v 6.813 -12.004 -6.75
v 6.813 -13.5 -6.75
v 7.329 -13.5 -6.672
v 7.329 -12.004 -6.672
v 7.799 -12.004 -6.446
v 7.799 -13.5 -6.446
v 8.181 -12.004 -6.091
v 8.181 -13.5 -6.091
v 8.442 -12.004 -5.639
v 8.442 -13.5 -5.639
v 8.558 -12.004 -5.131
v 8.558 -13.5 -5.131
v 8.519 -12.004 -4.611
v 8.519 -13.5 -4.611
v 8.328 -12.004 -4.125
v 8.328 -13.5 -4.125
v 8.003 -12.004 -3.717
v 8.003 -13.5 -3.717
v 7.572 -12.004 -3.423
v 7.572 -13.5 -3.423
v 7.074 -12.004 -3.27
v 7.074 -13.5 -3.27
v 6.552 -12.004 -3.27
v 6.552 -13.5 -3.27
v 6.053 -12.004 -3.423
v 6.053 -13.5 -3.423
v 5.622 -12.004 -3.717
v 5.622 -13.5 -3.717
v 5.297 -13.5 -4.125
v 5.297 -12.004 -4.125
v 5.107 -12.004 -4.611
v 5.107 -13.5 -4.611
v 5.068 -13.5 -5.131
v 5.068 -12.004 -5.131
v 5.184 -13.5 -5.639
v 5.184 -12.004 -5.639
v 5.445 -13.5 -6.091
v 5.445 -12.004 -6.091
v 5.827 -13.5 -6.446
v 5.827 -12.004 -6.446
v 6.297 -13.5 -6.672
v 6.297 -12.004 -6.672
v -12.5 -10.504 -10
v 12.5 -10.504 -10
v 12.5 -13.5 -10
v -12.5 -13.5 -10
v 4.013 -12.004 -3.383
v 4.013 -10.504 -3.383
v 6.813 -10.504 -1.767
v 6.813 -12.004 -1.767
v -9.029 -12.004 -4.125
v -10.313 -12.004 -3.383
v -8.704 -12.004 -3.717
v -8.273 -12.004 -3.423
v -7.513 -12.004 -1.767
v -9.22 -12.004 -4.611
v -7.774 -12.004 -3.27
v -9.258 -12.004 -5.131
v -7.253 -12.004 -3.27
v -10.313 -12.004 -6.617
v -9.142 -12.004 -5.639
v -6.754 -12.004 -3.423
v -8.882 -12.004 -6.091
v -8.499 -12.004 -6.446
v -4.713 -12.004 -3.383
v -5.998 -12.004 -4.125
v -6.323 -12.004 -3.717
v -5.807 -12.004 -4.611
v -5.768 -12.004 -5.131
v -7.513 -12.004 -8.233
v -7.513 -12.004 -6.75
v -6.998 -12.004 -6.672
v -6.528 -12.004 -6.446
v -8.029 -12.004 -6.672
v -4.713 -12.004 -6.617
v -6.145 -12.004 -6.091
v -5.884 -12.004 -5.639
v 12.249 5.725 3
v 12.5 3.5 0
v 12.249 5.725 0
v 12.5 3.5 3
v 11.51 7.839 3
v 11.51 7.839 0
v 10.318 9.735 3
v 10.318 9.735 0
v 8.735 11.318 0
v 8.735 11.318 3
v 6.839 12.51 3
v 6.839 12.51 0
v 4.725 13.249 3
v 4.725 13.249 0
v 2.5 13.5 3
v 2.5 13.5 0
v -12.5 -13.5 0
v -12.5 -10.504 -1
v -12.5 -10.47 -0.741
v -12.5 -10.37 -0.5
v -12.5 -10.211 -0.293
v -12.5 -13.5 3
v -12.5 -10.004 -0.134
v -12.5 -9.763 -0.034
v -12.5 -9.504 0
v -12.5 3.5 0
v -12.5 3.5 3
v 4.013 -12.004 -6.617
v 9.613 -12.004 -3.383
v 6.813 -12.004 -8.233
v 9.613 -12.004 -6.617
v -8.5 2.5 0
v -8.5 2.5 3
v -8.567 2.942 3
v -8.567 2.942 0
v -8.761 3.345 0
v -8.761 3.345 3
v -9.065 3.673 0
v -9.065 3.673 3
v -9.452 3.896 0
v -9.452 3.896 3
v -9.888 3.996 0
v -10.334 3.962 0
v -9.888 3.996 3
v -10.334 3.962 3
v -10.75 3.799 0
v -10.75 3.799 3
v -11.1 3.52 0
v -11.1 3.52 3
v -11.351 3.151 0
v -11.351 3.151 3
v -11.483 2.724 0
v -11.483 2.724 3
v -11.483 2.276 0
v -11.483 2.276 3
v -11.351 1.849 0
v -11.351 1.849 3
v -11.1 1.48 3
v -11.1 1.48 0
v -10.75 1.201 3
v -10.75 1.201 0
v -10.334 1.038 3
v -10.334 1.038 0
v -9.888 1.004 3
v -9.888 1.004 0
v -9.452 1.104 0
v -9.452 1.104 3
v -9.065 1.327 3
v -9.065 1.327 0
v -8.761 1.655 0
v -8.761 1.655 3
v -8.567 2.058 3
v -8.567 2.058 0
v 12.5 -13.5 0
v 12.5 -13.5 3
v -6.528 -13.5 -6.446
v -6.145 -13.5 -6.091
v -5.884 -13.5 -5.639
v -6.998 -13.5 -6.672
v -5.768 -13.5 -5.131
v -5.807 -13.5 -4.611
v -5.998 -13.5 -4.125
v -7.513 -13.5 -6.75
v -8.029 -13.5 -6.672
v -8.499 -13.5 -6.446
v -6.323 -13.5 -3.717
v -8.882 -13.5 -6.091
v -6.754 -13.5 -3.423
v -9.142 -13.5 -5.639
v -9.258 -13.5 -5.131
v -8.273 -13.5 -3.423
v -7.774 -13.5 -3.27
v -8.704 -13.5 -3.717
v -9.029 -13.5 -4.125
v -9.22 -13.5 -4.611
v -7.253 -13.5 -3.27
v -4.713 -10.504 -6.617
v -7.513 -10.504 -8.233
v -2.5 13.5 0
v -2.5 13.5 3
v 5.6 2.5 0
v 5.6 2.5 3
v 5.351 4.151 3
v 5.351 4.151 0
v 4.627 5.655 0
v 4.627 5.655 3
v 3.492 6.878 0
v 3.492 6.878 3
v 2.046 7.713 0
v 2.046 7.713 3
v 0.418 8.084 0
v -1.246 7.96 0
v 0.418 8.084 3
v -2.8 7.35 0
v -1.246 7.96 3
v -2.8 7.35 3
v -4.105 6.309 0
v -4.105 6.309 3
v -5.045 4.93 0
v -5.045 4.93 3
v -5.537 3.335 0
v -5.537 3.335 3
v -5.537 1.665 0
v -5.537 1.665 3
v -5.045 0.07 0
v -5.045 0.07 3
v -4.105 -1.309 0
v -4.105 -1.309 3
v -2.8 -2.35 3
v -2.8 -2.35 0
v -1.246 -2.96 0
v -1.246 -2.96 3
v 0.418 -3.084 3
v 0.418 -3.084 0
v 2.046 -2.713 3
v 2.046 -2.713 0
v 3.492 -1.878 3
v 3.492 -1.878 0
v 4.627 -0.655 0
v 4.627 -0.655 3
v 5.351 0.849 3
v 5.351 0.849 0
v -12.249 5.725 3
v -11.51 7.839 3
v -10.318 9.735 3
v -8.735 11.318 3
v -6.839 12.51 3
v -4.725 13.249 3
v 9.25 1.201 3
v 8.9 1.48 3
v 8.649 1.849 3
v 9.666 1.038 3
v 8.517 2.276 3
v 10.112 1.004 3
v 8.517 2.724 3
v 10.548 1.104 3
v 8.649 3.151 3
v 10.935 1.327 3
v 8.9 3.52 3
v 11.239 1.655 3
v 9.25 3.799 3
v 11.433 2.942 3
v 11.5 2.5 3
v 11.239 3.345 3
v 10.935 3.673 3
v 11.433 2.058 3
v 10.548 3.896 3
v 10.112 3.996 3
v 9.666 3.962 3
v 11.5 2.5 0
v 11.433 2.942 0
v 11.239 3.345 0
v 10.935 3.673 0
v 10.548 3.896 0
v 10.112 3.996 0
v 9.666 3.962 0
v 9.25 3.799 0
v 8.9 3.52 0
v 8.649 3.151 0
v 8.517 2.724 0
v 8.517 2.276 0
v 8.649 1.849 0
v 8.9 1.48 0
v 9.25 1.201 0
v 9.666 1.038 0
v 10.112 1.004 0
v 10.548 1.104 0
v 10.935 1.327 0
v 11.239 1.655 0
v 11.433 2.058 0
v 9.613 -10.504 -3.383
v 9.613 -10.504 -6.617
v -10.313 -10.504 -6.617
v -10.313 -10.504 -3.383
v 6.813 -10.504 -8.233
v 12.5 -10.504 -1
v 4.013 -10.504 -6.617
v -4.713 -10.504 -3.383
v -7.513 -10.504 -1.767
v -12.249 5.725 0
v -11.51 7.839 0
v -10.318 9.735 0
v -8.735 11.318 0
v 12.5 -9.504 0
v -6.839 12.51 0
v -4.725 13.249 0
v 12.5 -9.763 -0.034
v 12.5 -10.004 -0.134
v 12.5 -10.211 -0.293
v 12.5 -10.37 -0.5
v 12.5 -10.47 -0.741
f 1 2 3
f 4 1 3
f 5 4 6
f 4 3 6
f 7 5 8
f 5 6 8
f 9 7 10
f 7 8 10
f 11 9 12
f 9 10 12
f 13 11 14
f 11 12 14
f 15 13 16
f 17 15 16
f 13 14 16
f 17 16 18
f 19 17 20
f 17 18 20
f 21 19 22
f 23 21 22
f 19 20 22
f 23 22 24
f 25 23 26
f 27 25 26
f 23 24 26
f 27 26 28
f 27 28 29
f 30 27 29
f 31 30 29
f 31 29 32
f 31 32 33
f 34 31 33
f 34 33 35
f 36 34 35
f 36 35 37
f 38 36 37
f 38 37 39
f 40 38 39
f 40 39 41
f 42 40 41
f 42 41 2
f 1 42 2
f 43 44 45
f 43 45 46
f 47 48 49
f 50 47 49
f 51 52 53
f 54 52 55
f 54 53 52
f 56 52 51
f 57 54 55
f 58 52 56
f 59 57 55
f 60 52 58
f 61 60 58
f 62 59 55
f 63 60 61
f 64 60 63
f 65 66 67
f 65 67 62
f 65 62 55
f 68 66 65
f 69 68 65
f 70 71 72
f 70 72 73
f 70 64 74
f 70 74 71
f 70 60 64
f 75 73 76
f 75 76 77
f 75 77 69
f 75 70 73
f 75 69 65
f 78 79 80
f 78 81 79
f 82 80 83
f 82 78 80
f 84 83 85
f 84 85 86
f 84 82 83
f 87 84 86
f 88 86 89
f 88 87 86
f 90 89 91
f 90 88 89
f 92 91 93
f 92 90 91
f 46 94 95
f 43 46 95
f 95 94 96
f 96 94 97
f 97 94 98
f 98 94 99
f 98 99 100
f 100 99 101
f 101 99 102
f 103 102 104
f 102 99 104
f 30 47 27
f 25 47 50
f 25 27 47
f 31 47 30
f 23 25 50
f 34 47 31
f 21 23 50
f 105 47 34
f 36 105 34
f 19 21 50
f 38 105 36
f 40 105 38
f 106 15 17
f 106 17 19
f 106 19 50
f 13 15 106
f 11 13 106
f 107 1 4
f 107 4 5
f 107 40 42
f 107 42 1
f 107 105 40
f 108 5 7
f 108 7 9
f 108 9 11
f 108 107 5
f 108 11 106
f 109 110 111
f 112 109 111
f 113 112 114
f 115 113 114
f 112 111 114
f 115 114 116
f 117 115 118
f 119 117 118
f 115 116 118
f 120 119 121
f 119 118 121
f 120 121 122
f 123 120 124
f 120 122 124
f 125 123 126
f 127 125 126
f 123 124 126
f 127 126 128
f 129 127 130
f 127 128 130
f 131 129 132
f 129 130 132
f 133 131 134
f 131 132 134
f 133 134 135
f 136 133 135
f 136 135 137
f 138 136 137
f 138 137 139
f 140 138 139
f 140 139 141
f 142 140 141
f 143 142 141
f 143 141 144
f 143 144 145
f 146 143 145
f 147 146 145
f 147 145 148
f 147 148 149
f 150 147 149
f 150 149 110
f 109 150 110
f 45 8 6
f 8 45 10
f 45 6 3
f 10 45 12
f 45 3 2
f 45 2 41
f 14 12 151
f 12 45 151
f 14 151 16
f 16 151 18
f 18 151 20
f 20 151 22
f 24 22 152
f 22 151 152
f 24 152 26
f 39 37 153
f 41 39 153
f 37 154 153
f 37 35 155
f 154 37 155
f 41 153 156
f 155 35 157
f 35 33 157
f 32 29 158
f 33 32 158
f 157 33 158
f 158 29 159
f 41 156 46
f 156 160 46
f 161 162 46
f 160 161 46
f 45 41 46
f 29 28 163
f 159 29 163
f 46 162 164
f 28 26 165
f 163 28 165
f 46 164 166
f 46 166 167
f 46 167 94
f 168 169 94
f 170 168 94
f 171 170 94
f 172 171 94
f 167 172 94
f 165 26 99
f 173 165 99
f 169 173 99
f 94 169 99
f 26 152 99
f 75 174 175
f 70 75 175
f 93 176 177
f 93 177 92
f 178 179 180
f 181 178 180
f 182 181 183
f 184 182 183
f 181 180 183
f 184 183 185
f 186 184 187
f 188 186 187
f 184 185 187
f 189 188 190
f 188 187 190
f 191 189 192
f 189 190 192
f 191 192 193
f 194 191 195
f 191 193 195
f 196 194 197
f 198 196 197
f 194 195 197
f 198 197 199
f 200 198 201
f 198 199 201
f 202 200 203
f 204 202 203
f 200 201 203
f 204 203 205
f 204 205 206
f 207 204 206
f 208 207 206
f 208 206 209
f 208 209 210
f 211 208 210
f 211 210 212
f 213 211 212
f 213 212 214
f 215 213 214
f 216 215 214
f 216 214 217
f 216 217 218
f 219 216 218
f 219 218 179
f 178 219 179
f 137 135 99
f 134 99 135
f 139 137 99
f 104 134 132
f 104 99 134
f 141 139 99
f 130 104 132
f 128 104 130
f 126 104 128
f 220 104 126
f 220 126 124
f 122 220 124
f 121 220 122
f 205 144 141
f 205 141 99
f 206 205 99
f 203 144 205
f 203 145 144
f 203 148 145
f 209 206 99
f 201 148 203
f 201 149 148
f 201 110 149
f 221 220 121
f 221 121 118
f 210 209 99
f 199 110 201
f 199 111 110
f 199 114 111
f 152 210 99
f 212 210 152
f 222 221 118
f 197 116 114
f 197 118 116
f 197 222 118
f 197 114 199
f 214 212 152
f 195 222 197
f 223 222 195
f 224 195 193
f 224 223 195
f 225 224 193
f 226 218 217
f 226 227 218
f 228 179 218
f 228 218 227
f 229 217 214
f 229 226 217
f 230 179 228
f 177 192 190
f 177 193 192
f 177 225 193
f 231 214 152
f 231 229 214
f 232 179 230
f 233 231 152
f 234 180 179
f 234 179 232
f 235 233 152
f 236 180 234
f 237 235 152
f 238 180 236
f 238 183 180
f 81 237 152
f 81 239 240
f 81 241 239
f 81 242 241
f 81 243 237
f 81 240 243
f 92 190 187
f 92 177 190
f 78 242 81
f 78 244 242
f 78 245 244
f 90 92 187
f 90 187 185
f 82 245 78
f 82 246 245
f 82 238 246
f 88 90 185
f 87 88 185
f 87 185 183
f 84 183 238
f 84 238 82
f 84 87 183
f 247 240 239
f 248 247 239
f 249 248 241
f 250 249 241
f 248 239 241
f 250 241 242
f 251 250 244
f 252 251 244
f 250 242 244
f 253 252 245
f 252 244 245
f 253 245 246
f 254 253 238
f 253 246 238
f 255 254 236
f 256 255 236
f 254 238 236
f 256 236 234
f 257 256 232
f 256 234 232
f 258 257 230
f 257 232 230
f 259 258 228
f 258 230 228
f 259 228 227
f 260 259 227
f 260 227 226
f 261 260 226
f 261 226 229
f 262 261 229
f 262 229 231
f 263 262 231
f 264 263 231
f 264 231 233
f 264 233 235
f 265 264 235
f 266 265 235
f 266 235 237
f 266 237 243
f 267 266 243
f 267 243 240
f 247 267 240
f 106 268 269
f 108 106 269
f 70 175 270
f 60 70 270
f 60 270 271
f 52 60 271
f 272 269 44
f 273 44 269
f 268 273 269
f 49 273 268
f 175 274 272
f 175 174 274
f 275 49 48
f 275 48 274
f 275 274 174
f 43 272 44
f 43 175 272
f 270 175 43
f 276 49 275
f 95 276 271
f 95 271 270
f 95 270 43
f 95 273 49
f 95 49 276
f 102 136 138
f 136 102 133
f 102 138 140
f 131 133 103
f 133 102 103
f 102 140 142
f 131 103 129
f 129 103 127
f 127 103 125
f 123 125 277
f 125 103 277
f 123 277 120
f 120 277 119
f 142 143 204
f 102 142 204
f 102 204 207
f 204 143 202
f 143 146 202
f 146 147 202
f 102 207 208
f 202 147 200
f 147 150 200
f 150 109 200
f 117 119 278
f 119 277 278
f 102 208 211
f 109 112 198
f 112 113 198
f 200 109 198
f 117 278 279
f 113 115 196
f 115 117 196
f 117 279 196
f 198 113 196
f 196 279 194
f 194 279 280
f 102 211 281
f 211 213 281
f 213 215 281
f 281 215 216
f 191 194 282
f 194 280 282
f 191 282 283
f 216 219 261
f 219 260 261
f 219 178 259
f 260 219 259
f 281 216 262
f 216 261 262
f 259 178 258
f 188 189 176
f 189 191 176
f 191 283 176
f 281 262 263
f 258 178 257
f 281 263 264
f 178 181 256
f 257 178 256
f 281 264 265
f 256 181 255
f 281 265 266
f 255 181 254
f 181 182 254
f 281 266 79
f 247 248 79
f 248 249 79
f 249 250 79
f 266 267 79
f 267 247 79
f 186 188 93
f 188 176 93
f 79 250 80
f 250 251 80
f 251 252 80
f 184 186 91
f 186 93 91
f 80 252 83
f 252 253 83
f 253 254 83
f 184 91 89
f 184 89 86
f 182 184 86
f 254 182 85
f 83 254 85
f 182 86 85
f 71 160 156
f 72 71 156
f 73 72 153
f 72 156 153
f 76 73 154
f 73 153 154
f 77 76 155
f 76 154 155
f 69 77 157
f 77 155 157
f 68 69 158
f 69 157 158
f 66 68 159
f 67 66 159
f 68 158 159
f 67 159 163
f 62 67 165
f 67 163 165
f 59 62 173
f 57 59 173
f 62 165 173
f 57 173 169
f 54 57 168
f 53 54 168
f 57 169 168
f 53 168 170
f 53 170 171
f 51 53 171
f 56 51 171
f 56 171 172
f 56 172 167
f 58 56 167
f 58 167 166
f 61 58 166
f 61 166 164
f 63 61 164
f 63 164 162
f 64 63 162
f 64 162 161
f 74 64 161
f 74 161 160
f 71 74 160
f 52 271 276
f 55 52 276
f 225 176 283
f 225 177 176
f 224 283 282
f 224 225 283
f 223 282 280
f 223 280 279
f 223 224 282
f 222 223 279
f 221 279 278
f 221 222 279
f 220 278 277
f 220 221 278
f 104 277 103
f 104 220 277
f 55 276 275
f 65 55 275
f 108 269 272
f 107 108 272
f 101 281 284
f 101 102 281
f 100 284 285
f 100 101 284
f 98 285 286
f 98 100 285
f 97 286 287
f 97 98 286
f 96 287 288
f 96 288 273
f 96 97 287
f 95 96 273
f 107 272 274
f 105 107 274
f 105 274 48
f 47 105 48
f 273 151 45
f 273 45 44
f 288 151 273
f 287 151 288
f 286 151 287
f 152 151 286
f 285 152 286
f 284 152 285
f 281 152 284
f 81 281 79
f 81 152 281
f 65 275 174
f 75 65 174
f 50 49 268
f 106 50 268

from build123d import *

# Parameters (mm, degrees)
SKETCH_1_W           = 25
SKETCH_1_H           = 27
EXTRUDE_1_DEPTH      = 3
SKETCH_2_W           = 25
SKETCH_2_H           = 2.996002967
EXTRUDE_2_DEPTH      = 10
SKETCH_3_R           = 5.6
CUT_EXTRUDE_1_DEPTH  = 10
FILLET_1_R           = 10
SKETCH_4_R           = 1.75
CUT_EXTRUDE_2_DEPTH  = 10
FILLET_2_R           = 1
CUT_EXTRUDE_3_DEPTH  = 1.5
SKETCH_6_R           = 1.5
CUT_EXTRUDE_10_DEPTH = 23.527760652


with BuildPart() as part:
    # Эскиз1 → Бобышка-Вытянуть1 (new body)
    with BuildSketch(Plane.XY):
        Rectangle(SKETCH_1_W, SKETCH_1_H)
    extrude(amount=EXTRUDE_1_DEPTH)

    # Эскиз2 → Бобышка-Вытянуть2 (add)
    with BuildSketch(Plane(origin=(0, 0, 0), x_dir=(-1, 0, 0), z_dir=(0, 0, -1))):
        with Locations((0, -12.001998517)):
            Rectangle(SKETCH_2_W, SKETCH_2_H)
    extrude(amount=EXTRUDE_2_DEPTH)

    # Эскиз3 → Вырез-Вытянуть1 (cut)
    with BuildSketch(Plane.XY.offset(3)):
        with Locations((0, 2.5)):
            Circle(SKETCH_3_R)
    extrude(amount=-CUT_EXTRUDE_1_DEPTH, mode=Mode.SUBTRACT)

    # Скругление1
    fillet_1_edges = [part.edges().sort_by_distance(p)[0] for p in [
        (-12.5, 13.5, 1.5),
        (12.5, 13.5, 1.5),
    ]]
    fillet(fillet_1_edges, radius=FILLET_1_R)

    # Эскиз4 → Вырез-Вытянуть2 (cut)
    with BuildSketch(Plane.XZ.offset(13.5)):
        with Locations(Location((-7.513385328, -5, 0), (0, 0, 270))):
            Circle(SKETCH_4_R)
        with Locations(Location((6.812780265, -5, 0), (0, 0, 270))):
            Circle(SKETCH_4_R)
    extrude(amount=-CUT_EXTRUDE_2_DEPTH, mode=Mode.SUBTRACT)

    # Скругление2
    fillet_2_edges = [part.edges().sort_by_distance(p)[0] for p in [
        (0, -10.503997033, 0),
    ]]
    fillet(fillet_2_edges, radius=FILLET_2_R)

    # Эскиз5 → Вырез-Вытянуть3 (cut)
    with BuildSketch(Plane(origin=(0, -10.503997033, 0), x_dir=(1, 0, 0), z_dir=(0, 1, 0))):
        Polygon((9.612780265, 3.383419246), (9.612780265, 6.616580754), (6.812780265, 8.233161507), (4.012780265, 6.616580754), (4.012780265, 3.383419246), (6.812780265, 1.766838493), align=None)
        Polygon((-4.713385328, 3.383419246), (-4.713385328, 6.616580754), (-7.513385328, 8.233161507), (-10.313385328, 6.616580754), (-10.313385328, 3.383419246), (-7.513385328, 1.766838493), align=None)
    extrude(amount=-CUT_EXTRUDE_3_DEPTH, mode=Mode.SUBTRACT)

    # Эскиз6 → Вырез-Вытянуть10 (cut, through all)
    with BuildSketch(Plane.XY.offset(3)):
        with Locations((-10, 2.5)):
            Circle(SKETCH_6_R)
        with Locations((10, 2.5)):
            Circle(SKETCH_6_R)
    extrude(amount=-CUT_EXTRUDE_10_DEPTH, mode=Mode.SUBTRACT)


solid = part.part
